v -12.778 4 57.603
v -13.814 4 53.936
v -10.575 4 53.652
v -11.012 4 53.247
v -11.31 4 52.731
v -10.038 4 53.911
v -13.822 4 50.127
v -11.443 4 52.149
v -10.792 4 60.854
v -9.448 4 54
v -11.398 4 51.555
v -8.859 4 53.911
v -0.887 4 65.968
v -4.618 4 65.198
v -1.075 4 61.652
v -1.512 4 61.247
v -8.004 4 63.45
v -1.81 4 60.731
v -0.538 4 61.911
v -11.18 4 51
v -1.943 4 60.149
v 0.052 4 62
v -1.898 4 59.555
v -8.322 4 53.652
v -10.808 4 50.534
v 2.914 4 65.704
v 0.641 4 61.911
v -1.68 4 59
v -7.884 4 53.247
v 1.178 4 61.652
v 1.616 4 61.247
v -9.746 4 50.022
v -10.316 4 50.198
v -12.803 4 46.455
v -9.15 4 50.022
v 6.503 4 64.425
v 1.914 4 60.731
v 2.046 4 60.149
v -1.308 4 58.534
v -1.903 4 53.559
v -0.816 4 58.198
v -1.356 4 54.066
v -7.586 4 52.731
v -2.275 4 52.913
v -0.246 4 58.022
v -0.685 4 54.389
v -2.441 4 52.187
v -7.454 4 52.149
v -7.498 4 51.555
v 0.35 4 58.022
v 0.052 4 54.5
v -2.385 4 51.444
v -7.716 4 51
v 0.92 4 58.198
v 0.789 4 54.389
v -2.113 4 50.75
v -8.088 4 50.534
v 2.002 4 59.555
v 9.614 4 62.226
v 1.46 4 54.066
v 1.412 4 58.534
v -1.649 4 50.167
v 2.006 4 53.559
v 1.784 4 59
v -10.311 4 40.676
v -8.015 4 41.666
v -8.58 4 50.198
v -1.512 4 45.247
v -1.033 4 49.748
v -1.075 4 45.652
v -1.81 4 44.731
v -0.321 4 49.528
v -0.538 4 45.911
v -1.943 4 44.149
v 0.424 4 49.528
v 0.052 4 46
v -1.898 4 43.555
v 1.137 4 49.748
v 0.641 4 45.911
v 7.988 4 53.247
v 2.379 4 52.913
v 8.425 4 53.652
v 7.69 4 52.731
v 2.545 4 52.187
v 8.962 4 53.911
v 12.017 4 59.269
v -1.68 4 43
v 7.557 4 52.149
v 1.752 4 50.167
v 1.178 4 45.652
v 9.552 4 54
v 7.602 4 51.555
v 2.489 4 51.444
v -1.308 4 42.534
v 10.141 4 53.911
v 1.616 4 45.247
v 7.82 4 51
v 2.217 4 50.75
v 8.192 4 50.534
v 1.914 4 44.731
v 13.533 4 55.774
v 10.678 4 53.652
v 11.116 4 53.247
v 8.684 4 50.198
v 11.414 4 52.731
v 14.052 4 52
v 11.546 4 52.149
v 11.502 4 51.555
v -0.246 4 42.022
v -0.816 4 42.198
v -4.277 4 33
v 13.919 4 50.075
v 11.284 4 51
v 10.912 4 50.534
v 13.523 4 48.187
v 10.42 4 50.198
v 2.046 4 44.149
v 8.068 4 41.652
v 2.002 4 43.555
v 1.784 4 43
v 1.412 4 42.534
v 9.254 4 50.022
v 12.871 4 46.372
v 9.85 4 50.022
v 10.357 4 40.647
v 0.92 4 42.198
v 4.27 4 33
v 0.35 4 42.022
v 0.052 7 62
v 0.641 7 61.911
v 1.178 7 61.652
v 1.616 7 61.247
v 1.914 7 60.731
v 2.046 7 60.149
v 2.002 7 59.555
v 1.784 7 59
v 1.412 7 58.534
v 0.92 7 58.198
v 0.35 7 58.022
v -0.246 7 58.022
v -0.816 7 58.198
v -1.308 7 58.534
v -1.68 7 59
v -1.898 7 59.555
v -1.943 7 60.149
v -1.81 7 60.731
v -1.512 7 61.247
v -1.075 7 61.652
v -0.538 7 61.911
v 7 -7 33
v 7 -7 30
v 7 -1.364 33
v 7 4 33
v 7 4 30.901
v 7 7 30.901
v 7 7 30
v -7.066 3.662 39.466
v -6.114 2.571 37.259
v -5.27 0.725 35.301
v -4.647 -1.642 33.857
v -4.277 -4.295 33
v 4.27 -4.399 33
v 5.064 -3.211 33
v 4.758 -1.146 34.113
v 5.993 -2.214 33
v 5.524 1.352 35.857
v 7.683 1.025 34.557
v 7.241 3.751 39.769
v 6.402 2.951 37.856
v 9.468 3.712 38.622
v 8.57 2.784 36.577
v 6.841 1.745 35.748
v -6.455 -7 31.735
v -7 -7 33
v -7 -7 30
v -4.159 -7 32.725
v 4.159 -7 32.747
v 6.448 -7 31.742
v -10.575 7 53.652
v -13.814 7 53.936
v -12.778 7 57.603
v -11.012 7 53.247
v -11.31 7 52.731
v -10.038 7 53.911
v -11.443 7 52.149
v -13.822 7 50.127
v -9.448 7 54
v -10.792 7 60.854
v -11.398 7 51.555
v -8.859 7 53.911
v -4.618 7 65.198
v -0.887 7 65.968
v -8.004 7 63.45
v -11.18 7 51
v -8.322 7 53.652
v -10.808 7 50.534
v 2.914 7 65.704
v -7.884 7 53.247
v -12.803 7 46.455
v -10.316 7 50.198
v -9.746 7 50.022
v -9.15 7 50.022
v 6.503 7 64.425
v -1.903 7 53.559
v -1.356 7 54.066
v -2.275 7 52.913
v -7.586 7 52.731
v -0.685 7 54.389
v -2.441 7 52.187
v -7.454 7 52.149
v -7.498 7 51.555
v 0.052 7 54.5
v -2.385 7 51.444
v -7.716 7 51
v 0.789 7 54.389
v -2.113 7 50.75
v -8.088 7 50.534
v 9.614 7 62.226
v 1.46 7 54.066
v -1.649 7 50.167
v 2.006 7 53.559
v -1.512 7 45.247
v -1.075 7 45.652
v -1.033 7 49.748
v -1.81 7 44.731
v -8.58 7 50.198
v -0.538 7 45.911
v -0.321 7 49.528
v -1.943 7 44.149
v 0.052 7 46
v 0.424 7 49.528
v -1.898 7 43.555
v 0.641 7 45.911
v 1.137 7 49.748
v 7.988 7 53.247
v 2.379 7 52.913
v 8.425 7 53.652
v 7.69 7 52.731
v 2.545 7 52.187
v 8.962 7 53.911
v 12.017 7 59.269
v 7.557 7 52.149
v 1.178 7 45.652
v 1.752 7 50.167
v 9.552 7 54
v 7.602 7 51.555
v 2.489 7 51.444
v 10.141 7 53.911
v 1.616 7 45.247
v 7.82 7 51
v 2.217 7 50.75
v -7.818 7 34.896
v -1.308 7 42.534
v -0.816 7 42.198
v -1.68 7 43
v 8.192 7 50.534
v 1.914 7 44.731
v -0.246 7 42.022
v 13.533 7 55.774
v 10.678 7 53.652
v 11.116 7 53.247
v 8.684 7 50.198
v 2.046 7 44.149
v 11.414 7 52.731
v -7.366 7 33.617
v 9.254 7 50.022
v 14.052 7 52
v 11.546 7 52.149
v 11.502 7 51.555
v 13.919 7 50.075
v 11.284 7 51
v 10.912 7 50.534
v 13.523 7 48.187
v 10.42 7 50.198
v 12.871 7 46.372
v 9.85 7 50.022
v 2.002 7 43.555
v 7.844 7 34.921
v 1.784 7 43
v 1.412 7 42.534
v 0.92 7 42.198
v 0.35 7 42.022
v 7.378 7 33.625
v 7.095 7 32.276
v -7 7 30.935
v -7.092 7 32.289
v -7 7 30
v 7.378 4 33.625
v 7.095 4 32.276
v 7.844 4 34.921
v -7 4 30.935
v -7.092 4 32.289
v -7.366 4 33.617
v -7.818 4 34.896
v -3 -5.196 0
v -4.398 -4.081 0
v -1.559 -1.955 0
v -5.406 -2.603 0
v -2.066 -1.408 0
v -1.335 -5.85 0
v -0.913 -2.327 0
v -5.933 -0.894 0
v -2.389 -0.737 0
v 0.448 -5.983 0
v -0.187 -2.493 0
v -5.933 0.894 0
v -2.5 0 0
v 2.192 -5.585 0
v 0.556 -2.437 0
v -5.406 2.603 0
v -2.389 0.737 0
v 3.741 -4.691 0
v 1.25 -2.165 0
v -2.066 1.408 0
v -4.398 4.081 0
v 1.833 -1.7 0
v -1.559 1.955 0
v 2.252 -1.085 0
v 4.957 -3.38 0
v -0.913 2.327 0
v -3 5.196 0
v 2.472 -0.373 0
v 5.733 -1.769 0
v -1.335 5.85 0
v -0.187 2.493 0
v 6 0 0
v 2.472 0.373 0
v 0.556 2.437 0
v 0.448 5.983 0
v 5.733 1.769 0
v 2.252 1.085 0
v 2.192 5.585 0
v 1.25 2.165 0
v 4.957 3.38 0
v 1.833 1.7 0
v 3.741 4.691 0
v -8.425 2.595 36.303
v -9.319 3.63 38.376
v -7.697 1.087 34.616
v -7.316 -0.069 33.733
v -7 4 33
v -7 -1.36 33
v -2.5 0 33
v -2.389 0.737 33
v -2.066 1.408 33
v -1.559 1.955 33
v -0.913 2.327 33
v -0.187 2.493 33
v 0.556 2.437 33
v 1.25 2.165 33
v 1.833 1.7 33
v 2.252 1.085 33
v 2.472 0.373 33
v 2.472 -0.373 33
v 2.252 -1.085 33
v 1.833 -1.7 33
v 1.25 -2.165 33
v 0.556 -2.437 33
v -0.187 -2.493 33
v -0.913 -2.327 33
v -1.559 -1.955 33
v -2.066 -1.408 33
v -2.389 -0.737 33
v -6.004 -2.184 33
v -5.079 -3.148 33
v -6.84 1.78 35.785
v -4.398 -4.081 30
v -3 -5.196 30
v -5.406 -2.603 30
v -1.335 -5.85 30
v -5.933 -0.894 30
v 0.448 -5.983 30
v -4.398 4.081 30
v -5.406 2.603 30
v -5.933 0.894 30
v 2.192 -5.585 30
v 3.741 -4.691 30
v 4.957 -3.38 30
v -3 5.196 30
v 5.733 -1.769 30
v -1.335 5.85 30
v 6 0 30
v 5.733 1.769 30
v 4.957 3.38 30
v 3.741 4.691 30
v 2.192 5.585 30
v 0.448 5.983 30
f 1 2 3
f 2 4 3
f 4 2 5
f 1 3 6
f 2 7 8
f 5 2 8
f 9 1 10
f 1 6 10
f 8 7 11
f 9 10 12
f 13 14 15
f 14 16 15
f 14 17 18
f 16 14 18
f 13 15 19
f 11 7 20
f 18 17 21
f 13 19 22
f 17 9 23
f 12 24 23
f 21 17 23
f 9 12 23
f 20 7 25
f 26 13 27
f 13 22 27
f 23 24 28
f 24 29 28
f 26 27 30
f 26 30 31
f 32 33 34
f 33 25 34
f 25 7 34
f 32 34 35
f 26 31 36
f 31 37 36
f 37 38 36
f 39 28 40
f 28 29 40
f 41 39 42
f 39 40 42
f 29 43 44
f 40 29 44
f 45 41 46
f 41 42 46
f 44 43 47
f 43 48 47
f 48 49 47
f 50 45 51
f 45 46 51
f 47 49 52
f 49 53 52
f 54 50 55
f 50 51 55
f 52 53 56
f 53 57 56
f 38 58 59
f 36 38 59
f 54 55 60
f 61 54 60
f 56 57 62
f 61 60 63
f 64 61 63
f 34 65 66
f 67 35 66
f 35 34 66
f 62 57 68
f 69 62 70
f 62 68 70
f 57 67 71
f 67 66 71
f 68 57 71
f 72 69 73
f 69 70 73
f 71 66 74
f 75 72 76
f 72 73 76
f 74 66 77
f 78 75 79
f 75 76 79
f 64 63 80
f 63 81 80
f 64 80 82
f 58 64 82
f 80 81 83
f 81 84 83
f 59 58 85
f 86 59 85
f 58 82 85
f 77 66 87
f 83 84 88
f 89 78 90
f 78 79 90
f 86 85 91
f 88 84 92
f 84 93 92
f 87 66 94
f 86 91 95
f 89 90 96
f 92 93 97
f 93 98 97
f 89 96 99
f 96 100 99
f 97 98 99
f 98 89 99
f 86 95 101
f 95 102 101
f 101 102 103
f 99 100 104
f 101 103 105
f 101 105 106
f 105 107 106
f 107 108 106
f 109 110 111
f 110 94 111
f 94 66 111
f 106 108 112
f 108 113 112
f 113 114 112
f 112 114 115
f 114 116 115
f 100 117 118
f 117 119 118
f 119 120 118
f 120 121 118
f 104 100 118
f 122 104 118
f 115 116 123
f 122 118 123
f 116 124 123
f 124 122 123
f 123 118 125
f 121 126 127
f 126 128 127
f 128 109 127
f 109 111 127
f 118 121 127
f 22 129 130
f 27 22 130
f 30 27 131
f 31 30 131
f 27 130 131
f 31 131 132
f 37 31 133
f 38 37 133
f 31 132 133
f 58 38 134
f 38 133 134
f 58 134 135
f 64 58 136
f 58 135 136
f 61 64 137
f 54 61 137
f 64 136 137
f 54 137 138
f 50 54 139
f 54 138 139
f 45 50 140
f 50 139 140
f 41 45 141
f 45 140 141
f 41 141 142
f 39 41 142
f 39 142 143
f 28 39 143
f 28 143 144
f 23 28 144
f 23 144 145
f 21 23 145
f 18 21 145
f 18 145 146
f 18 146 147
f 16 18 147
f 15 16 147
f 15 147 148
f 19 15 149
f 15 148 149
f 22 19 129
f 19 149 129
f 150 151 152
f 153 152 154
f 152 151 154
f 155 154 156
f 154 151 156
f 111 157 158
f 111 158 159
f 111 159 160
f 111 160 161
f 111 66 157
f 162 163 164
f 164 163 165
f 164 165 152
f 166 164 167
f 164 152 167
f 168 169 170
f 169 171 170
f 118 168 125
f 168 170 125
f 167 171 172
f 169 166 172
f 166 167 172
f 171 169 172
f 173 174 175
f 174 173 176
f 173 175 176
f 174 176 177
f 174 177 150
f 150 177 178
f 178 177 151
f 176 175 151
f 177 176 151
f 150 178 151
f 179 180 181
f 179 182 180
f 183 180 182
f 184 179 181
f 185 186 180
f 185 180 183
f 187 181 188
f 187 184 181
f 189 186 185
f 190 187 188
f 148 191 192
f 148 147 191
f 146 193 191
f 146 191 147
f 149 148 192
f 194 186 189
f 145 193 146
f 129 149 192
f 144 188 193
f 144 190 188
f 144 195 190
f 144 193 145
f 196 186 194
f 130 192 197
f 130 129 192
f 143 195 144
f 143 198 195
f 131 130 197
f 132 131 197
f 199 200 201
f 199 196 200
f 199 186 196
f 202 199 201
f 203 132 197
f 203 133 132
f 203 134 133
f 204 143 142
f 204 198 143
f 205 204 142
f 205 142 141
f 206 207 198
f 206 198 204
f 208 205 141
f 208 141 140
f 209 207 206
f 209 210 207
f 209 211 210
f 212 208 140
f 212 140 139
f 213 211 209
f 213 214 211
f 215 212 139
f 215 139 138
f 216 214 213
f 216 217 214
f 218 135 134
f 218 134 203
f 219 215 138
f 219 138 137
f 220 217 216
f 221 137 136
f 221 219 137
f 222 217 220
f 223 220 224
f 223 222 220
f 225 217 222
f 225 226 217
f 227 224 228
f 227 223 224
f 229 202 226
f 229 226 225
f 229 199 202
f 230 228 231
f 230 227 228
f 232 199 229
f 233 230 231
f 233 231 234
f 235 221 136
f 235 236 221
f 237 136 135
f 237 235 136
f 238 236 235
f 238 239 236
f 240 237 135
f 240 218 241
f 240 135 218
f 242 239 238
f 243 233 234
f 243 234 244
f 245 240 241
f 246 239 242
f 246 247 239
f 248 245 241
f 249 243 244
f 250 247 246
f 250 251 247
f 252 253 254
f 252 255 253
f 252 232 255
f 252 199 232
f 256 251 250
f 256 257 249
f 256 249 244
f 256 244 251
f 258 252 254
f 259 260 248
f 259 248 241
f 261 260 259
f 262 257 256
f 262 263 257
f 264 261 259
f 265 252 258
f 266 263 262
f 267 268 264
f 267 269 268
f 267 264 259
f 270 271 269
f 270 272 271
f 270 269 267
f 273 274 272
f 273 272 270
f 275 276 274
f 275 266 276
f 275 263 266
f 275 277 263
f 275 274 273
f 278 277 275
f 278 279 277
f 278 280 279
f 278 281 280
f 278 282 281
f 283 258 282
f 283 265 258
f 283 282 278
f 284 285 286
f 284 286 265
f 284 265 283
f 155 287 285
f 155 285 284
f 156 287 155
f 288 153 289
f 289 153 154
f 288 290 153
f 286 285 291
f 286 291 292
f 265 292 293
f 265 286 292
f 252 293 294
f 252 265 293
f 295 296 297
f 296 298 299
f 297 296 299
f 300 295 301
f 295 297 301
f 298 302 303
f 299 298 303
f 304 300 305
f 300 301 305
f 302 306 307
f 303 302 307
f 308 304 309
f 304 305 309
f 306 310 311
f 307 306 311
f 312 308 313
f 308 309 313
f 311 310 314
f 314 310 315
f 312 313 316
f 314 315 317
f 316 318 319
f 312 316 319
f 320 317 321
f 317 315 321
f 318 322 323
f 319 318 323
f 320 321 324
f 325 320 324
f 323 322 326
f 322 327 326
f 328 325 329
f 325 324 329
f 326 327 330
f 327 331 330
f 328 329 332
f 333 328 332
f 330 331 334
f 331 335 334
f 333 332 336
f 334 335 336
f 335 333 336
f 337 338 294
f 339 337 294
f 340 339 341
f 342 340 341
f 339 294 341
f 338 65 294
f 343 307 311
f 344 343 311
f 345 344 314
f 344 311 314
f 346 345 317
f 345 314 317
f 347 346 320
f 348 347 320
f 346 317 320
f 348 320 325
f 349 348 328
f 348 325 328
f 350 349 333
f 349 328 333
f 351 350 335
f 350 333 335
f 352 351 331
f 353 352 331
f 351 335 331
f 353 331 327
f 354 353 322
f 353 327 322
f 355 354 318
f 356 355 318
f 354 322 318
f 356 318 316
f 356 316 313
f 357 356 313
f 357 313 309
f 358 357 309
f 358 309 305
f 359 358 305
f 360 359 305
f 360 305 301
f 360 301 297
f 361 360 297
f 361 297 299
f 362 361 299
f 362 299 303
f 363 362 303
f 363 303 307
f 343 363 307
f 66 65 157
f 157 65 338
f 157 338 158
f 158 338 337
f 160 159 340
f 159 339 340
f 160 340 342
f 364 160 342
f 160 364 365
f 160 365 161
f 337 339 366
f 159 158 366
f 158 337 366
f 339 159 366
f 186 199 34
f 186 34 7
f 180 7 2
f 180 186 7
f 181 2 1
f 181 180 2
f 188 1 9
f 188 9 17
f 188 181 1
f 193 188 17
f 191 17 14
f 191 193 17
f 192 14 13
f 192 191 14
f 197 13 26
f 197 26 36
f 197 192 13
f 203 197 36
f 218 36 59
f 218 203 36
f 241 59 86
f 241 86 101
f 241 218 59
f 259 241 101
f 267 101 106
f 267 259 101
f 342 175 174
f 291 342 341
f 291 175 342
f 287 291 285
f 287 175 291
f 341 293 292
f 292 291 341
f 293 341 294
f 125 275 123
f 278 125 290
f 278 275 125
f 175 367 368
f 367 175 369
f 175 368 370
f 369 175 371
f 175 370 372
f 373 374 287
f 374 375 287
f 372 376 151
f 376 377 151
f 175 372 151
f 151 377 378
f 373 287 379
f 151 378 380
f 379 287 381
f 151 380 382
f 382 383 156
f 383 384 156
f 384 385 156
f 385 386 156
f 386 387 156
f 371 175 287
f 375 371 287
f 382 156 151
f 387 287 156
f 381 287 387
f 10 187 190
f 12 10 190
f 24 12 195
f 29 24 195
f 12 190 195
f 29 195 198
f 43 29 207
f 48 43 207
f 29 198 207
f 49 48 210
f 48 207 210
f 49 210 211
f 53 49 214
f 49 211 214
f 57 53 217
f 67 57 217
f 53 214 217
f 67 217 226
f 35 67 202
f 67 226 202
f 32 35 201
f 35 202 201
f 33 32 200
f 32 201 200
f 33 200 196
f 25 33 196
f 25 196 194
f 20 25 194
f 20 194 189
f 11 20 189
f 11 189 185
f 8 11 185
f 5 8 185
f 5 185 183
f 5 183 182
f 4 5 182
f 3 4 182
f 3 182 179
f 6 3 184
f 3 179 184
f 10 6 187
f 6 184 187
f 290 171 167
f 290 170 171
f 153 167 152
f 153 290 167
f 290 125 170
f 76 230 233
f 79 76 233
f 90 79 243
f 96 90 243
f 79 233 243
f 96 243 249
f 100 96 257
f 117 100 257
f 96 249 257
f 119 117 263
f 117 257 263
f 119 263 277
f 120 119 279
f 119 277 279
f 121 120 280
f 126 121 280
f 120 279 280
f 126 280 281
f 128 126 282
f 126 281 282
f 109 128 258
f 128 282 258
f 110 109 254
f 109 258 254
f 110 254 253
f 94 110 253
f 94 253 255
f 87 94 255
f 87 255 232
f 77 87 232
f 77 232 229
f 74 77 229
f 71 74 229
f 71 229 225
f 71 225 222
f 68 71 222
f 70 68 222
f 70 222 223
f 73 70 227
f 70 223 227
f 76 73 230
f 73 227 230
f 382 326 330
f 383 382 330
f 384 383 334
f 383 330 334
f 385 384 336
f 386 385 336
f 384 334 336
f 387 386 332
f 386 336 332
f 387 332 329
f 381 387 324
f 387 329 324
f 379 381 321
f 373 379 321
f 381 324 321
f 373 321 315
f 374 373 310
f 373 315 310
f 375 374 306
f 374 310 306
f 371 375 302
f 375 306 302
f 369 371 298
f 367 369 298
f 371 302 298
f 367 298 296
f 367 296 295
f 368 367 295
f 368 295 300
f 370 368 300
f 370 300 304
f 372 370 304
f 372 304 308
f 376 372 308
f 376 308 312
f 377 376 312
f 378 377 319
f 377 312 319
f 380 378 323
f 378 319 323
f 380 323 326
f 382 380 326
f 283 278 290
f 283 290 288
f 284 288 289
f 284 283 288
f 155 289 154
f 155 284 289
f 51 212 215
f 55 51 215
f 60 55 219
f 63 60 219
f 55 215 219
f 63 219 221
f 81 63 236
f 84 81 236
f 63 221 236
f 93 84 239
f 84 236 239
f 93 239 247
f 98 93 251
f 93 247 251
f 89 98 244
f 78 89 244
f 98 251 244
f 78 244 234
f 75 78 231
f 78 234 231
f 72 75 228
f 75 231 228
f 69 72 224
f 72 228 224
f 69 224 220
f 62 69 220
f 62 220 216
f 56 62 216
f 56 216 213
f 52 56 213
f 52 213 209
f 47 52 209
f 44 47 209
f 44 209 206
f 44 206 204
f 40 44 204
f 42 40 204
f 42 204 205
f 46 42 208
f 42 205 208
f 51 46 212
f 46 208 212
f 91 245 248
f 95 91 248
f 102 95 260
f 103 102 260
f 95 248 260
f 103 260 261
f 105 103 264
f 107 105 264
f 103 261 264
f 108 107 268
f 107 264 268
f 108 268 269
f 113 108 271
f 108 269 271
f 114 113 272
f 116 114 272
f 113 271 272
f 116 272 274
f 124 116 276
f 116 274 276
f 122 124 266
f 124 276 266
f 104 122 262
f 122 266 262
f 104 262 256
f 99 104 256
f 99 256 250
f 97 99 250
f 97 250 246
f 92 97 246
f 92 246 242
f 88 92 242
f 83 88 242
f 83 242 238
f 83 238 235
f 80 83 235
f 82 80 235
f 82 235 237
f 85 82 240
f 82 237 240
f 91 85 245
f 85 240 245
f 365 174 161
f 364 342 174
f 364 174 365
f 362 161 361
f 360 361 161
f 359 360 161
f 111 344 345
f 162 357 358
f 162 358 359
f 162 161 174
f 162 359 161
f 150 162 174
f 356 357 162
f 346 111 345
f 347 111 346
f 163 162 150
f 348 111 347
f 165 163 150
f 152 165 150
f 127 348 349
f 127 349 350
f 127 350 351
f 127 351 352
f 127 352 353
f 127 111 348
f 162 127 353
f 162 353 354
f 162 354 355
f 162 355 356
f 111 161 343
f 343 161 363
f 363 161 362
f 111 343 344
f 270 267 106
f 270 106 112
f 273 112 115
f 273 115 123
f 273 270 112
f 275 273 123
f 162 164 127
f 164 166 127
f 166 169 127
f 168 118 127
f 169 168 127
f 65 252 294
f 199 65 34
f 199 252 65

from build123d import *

# Parameters (mm, degrees)
SKETCH1_R                   = 6
ARM_INSERT_DEPTH            = 30
SKETCH2_W                   = 14
SKETCH2_H                   = 14
FACE_PLATE_DEPTH            = 3
SKETCH3_R                   = 2
SKETCH3_R_2                 = 2.5
MOTOR_MOUNT_DEPTH           = 3
MOTOR_MOUNT_SUPPORT_1_DEPTH = 2.5
MOTOR_MOUNT_SUPPORT_2_DEPTH = 2.5
SKETCH8_R                   = 2.5
LIGHTENING_HOLE_DEPTH       = 68.841325022


with BuildPart() as part:
    # Sketch1 → Arm Insert (new body)
    with BuildSketch(Plane.XY):
        Circle(SKETCH1_R)
    extrude(amount=ARM_INSERT_DEPTH)

    # Sketch2 → Face Plate (add)
    with BuildSketch(Plane.XY.offset(30)):
        Rectangle(SKETCH2_W, SKETCH2_H)
    extrude(amount=FACE_PLATE_DEPTH)

    # Sketch3 → Motor Mount (add)
    # profile 1 of 2: a face of its own
    with BuildSketch(Plane(origin=(0, 7, 0), x_dir=(1, 0, 0), z_dir=(0, 1, 0))):
        with BuildLine():
            ThreePointArc((-7, -30.935385736), (-7.206551185, -32.957355148), (-7.817672061, -34.895796524))
            Line((-7.817672061, -34.895796524), (-12.803400836, -46.455354126))
            ThreePointArc((-12.803400836, -46.455354126), (0.006350978, -38.000003191), (12.870800409, -46.371899141))
            Line((12.870800409, -46.371899141), (7.843612764, -34.921493496))
            ThreePointArc((7.843612764, -34.921493496), (7.213175378, -32.95526455), (7, -30.901472004))
            Line((7, -30.901472004), (7, -33))
            Line((7, -33), (-7, -33))
            Line((-7, -33), (-7, -30.935385736))
        make_face()
    # profile 2 of 2: a face of its own
    with BuildSketch(Plane(origin=(0, 7, 0), x_dir=(1, 0, 0), z_dir=(0, 1, 0))):
        with BuildLine():
            ThreePointArc((12.870800409, -46.371899141), (0.006350978, -38.000003191), (-12.803400836, -46.455354126))
            ThreePointArc((-12.803400836, -46.455354126), (-2.778898897, -65.710757571), (14.051858279, -51.999929229))
            ThreePointArc((14.051858279, -51.999929229), (13.75341275, -49.124619665), (12.870800409, -46.371899141))
        make_face()
        with Locations(Location((-9.448141721, -51.999929229, 0), (0, 0, 270))):
            Circle(SKETCH3_R, mode=Mode.SUBTRACT)
        with Locations(Location((0.051858279, -59.999929229, 0), (0, 0, 270))):
            Circle(SKETCH3_R, mode=Mode.SUBTRACT)
        with Locations(Location((0.051858279, -51.999929229, 0), (0, 0, 270))):
            Circle(SKETCH3_R_2, mode=Mode.SUBTRACT)
        with Locations(Location((9.551858279, -51.999929229, 0), (0, 0, 270))):
            Circle(SKETCH3_R, mode=Mode.SUBTRACT)
        with Locations(Location((0.051858279, -43.999929229, 0), (0, 0, 270))):
            Circle(SKETCH3_R, mode=Mode.SUBTRACT)
    extrude(amount=-MOTOR_MOUNT_DEPTH)

    # Sketch4 → Motor Mount Support 1 (add)
    with BuildSketch(Plane(origin=(6.098650662, 0, 2.630396348), x_dir=(-0.39604107883214285, 0, 0.9182327939457796), z_dir=(-0.9182327939457796, 0, -0.39604107883214285))):
        with BuildLine():
            Line((31.696620561, -7), (31.696620561, 4))
            Line((31.696620561, 4), (41.433043154, 4))
            add(Edge.make_bspline(
                [(41.433043154, 4), (31.696620561, 4), (31.696620561, -7)],
                knots=[3.141592654, 3.141592654, 3.141592654, 4.71238898, 4.71238898, 4.71238898], degree=2, weights=[1, 0.707106781, 1]))
        make_face()
    extrude(amount=-MOTOR_MOUNT_SUPPORT_1_DEPTH)

    # Sketch5 → Motor Mount Support 2 (add)
    with BuildSketch(Plane(origin=(-6.278168341, 0, 2.756367878), x_dir=(-0.402002149140903, 0, -0.9156387235619163), z_dir=(0.9156387235619163, 0, -0.402002149140903))):
        with BuildLine():
            Line((-31.656634836, -7), (-31.656634836, 4))
            Line((-31.656634836, 4), (-41.381308441, 4))
            add(Edge.make_bspline(
                [(-31.656634836, -7), (-31.656634836, 4), (-41.381308441, 4)],
                knots=[1.570796327, 1.570796327, 1.570796327, 3.141592654, 3.141592654, 3.141592654], degree=2, weights=[1, 0.707106781, 1]))
        make_face()
    extrude(amount=-MOTOR_MOUNT_SUPPORT_2_DEPTH)

    # Sketch8 → Lightening Hole (cut, through all)
    with BuildSketch(Plane(origin=(0, 0, 0), x_dir=(-1, 0, 0), z_dir=(0, 0, -1))):
        Circle(SKETCH8_R)
    extrude(amount=-LIGHTENING_HOLE_DEPTH, mode=Mode.SUBTRACT)


solid = part.part
